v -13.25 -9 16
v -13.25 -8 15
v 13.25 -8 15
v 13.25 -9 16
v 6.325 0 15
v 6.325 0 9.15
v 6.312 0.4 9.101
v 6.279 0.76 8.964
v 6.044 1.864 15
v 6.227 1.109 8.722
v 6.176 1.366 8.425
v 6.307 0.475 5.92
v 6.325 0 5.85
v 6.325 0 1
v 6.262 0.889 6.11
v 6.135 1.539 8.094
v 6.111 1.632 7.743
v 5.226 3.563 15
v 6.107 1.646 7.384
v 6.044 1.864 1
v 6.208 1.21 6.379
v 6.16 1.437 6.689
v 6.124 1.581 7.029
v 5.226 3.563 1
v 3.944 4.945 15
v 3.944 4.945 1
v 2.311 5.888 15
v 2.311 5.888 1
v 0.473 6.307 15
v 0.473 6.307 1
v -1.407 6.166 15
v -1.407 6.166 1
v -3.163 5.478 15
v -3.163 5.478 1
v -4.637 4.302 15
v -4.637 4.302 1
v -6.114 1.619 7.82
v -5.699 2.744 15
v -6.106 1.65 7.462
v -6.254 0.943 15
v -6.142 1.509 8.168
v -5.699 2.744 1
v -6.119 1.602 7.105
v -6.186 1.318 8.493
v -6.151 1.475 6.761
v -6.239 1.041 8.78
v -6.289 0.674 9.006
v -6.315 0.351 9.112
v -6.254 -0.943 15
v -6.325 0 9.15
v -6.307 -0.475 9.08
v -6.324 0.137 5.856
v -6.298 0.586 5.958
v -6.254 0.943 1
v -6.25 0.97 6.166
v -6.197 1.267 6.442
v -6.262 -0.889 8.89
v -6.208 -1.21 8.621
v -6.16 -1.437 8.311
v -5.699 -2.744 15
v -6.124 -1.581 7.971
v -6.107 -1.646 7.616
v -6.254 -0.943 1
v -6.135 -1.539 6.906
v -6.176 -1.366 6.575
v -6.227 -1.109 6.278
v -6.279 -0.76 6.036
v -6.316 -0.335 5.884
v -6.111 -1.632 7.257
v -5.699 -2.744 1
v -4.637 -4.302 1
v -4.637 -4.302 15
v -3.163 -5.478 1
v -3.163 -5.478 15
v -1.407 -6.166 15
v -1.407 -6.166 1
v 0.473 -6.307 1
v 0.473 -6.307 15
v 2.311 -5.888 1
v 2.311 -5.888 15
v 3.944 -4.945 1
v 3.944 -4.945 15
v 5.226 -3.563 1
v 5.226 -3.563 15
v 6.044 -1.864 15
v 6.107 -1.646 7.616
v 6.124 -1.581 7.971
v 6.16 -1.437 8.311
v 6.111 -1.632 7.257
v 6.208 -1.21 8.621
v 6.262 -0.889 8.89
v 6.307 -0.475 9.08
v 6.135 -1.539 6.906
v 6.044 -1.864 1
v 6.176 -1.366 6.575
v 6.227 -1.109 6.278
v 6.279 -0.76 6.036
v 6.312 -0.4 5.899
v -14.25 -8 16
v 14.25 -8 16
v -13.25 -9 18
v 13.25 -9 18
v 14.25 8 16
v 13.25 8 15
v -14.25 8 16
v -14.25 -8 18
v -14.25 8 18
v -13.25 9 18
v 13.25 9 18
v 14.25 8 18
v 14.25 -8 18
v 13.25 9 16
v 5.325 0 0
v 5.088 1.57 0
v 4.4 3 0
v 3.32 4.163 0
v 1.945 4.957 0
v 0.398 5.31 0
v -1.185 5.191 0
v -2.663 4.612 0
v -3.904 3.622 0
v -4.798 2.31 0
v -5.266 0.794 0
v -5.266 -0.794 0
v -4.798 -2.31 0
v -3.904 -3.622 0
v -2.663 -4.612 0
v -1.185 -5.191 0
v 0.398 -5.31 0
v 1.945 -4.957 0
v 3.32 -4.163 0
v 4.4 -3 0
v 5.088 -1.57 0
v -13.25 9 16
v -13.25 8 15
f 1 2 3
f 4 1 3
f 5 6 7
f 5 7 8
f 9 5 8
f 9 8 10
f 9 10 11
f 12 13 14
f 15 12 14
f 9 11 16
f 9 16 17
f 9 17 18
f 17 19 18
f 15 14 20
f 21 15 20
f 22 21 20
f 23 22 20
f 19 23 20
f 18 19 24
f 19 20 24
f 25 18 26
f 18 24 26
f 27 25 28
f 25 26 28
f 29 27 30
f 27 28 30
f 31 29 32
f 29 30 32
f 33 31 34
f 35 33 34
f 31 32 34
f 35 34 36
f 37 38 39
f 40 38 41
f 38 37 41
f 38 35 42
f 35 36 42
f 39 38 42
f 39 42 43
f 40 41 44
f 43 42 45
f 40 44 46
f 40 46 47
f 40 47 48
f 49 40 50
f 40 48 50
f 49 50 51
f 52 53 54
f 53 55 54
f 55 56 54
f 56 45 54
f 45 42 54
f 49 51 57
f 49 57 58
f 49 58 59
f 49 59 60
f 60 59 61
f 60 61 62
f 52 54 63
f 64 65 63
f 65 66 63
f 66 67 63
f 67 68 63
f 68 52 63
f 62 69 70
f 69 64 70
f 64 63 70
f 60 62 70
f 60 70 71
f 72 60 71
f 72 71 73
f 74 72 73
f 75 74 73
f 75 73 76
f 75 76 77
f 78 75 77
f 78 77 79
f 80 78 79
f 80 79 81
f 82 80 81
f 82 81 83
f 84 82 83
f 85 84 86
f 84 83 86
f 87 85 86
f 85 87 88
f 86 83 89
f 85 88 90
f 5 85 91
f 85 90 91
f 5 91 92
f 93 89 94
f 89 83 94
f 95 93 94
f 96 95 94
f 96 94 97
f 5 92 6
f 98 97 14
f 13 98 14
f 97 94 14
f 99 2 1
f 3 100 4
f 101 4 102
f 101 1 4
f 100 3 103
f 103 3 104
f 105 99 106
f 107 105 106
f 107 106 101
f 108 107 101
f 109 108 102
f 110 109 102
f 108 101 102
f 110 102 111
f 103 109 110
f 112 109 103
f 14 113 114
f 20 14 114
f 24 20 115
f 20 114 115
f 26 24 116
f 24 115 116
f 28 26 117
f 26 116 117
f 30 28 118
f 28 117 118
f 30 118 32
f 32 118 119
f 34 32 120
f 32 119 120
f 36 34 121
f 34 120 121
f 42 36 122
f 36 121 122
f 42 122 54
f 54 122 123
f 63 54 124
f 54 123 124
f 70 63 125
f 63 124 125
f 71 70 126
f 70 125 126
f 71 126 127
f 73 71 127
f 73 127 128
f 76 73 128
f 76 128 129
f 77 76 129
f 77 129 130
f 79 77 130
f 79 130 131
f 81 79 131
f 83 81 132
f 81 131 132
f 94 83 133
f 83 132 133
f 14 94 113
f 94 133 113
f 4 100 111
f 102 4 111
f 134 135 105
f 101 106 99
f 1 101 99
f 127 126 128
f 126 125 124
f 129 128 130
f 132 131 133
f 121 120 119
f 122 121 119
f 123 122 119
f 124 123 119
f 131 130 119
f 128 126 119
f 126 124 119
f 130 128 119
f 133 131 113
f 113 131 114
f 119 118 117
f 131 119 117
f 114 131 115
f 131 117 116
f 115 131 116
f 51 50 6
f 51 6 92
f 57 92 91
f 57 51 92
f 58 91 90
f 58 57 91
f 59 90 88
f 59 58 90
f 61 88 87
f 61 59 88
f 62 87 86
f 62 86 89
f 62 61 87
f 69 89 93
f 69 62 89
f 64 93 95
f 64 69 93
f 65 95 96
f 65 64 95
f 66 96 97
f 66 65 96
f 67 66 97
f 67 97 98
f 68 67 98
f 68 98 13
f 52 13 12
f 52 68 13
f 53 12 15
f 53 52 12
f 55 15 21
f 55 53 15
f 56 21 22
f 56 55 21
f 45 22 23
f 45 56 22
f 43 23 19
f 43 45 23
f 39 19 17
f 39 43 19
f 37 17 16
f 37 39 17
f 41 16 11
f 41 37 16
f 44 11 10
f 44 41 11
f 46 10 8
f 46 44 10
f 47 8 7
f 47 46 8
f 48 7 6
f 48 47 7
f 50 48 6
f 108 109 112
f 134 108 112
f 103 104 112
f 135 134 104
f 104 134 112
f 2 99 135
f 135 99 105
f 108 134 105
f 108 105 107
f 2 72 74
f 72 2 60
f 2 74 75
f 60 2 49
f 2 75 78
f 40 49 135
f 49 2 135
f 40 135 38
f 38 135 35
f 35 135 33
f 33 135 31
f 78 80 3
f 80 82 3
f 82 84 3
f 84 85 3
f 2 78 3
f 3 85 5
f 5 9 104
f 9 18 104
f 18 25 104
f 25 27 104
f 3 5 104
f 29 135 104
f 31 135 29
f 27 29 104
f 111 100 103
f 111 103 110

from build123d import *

# Parameters (mm, degrees)
SKETCH_1_R               = 6.325
EXTRUDE_1_DEPTH          = 15
SKETCH_2_W               = 28.5
SKETCH_2_H               = 18
EXTRUDE_2_DEPTH          = 3
EXTRUDE_START            = 14.25
SKETCH_4_R               = 1.6
EXTRUDE_3_DEPTH          = 7
EXTRUDE_START_2          = -7.25
SKETCH_4_2_R             = 1.6
EXTRUDE_4_DEPTH          = 7
EXTRUDE_START_3          = -7
EXTRUDE_5_DEPTH          = 7
SKETCH_7_R               = 1.75
CUT_EXTRUDE_1_DEPTH      = 65.242217427
CHAMFER_1_SIZE           = 1
CHAMFER_2_SIZE           = 1
CUT_EXTRUDE_2_DEPTH      = 64.238141181
CUT_EXTRUDE_2_DEPTH_BACK = 64.238141181
SKETCH_8_R               = 1.65
CUT_EXTRUDE_START        = -18
CUT_EXTRUDE_3_OUTLINE_W  = 7
CUT_EXTRUDE_3_OUTLINE_H  = 43
CUT_EXTRUDE_3_OUTLINE_R  = 1.75
CUT_EXTRUDE_3_DEPTH      = 23


# Read off the part's stored shape, not the designer's step: ｶｯﾄ - 押し出し3
with BuildPart() as part:
    # ｽｹｯﾁ1 → ﾎﾞｽ - 押し出し1 (new body)
    with BuildSketch(Plane.XY):
        Circle(SKETCH_1_R)
    extrude(amount=EXTRUDE_1_DEPTH)

    # ｽｹｯﾁ2 → ﾎﾞｽ - 押し出し2 (add)
    with BuildSketch(Plane.XY.offset(15)):
        Rectangle(SKETCH_2_W, SKETCH_2_H)
    extrude(amount=EXTRUDE_2_DEPTH)

    # ｽｹｯﾁ4 → ﾎﾞｽ - 押し出し3 (add)
    with BuildSketch(Plane(origin=(0, 0, 0), x_dir=(0, 0, -1), z_dir=(1, 0, 0)).offset(EXTRUDE_START)):
        with BuildLine():
            Line((-54.074074074, 13.913518208), (-28, 9))
            Line((-28, 9), (-18, 9))
            Line((-18, 9), (-18, -9))
            Line((-18, -9), (-56.624751337, 4.271344473))
            ThreePointArc((-56.624751337, 4.271344473), (-59.833732287, 10.278683768), (-54.074074074, 13.913518208))
        make_face()
        with Locations(Location((-55, 9, 0), (0, 0, 270))):
            Circle(SKETCH_4_R, mode=Mode.SUBTRACT)
    extrude(amount=-EXTRUDE_3_DEPTH)

    # ｽｹｯﾁ4<2> → ﾎﾞｽ - 押し出し4 (add)
    with BuildSketch(Plane(origin=(0, 0, 0), x_dir=(0, 0, -1), z_dir=(1, 0, 0)).offset(EXTRUDE_START_2)):
        with BuildLine():
            Line((-54.074074074, 13.913518208), (-28, 9))
            Line((-28, 9), (-18, 9))
            Line((-18, 9), (-18, -9))
            Line((-18, -9), (-56.624751337, 4.271344473))
            ThreePointArc((-56.624751337, 4.271344473), (-59.833732287, 10.278683768), (-54.074074074, 13.913518208))
        make_face()
        with Locations(Location((-55, 9, 0), (0, 0, 270))):
            Circle(SKETCH_4_2_R, mode=Mode.SUBTRACT)
    extrude(amount=-EXTRUDE_4_DEPTH)

    # ｽｹｯﾁ5 → ﾎﾞｽ - 押し出し5 (add)
    with BuildSketch(Plane.ZY.offset(14.25).offset(EXTRUDE_START_3)):
        with BuildLine():
            Line((18, -9), (33.823085464, -9))
            Line((33.823085464, -9), (57.5, 4.669872981))
            ThreePointArc((57.5, 4.669872981), (57.071979643, 4.44951647), (56.624751337, 4.271344473))
            Line((56.624751337, 4.271344473), (18, -9))
        make_face()
    extrude_5 = extrude(amount=EXTRUDE_5_DEPTH)

    # ﾐﾗｰ1: ﾎﾞｽ - 押し出し5 across plane
    add(extrude_5.mirror(Plane(origin=(0, 0, 0), x_dir=(0, 0, 1), z_dir=(1, 0, 0))))

    # ｽｹｯﾁ7 → ｶｯﾄ - 押し出し1 (cut, through all)
    with BuildSketch(Plane(origin=(0, 9, 0), x_dir=(1, 0, 0), z_dir=(0, 1, 0))):
        with Locations(Location((10.75, -23, 0), (0, 0, 270))):
            Circle(SKETCH_7_R)
        with Locations(Location((-10.75, -23, 0), (0, 0, 90))):
            Circle(SKETCH_7_R)
    extrude(amount=-CUT_EXTRUDE_1_DEPTH, mode=Mode.SUBTRACT)

    # 面取り1
    chamfer_1_edges = [part.edges().sort_by_distance(p)[0] for p in [
        (14.25, 11.456759104, 41.037037037),
        (-14.25, 11.456759104, 41.037037037),
        (-14.25, 10.737621487, 59.688354889),
        (-14.25, -2.165063509, 45.661542732),
        (14.25, 0, 15),
        (14.25, -9, 24.411542732),
        (0, 9, 15),
        (14.25, 10.737621487, 59.688354889),
        (14.25, 9, 21.5),
        (-14.25, 0, 15),
        (14.25, -2.165063509, 45.661542732),
        (-14.25, 9, 21.5),
        (0, -9, 15),
        (-14.25, -9, 24.411542732),
    ]]
    chamfer(chamfer_1_edges, length=CHAMFER_1_SIZE)

    # 面取り2
    chamfer_2_edges = [part.edges().sort_by_distance(p)[0] for p in [
        (-6.325, 0, 0),
    ]]
    chamfer(chamfer_2_edges, length=CHAMFER_2_SIZE)

    # ｽｹｯﾁ8 → ｶｯﾄ - 押し出し2 (cut, two sides: drawn at the far end of the back side and taken through both)
    with BuildSketch(Plane(origin=(0, 0, 0), x_dir=(0, 0, -1), z_dir=(1, 0, 0)).offset(-CUT_EXTRUDE_2_DEPTH_BACK)):
        with Locations(Location((-7.5, 0, 0), (0, 0, 180))):
            Circle(SKETCH_8_R)
    extrude(amount=CUT_EXTRUDE_2_DEPTH + CUT_EXTRUDE_2_DEPTH_BACK, mode=Mode.SUBTRACT)

    # ｶｯﾄ - 押し出し3 outline → ｶｯﾄ - 押し出し3 (cut)
    # profile 1 of 2: a face of its own
    with BuildSketch(Plane(origin=(0, 9, 0), x_dir=(1, 0, 0), z_dir=(0, 1, 0)).offset(CUT_EXTRUDE_START)):
        with Locations((-10.75, -39.5)):
            Rectangle(CUT_EXTRUDE_3_OUTLINE_W, CUT_EXTRUDE_3_OUTLINE_H)
        with Locations((-10.75, -23)):
            Circle(CUT_EXTRUDE_3_OUTLINE_R, mode=Mode.SUBTRACT)
    # profile 2 of 2: a face of its own
    with BuildSketch(Plane(origin=(0, 9, 0), x_dir=(1, 0, 0), z_dir=(0, 1, 0)).offset(CUT_EXTRUDE_START)):
        with Locations((10.75, -39.5)):
            Rectangle(CUT_EXTRUDE_3_OUTLINE_W, CUT_EXTRUDE_3_OUTLINE_H)
        with Locations((10.75, -23)):
            Circle(CUT_EXTRUDE_3_OUTLINE_R, mode=Mode.SUBTRACT)
    extrude(amount=CUT_EXTRUDE_3_DEPTH, mode=Mode.SUBTRACT)


solid = part.part
